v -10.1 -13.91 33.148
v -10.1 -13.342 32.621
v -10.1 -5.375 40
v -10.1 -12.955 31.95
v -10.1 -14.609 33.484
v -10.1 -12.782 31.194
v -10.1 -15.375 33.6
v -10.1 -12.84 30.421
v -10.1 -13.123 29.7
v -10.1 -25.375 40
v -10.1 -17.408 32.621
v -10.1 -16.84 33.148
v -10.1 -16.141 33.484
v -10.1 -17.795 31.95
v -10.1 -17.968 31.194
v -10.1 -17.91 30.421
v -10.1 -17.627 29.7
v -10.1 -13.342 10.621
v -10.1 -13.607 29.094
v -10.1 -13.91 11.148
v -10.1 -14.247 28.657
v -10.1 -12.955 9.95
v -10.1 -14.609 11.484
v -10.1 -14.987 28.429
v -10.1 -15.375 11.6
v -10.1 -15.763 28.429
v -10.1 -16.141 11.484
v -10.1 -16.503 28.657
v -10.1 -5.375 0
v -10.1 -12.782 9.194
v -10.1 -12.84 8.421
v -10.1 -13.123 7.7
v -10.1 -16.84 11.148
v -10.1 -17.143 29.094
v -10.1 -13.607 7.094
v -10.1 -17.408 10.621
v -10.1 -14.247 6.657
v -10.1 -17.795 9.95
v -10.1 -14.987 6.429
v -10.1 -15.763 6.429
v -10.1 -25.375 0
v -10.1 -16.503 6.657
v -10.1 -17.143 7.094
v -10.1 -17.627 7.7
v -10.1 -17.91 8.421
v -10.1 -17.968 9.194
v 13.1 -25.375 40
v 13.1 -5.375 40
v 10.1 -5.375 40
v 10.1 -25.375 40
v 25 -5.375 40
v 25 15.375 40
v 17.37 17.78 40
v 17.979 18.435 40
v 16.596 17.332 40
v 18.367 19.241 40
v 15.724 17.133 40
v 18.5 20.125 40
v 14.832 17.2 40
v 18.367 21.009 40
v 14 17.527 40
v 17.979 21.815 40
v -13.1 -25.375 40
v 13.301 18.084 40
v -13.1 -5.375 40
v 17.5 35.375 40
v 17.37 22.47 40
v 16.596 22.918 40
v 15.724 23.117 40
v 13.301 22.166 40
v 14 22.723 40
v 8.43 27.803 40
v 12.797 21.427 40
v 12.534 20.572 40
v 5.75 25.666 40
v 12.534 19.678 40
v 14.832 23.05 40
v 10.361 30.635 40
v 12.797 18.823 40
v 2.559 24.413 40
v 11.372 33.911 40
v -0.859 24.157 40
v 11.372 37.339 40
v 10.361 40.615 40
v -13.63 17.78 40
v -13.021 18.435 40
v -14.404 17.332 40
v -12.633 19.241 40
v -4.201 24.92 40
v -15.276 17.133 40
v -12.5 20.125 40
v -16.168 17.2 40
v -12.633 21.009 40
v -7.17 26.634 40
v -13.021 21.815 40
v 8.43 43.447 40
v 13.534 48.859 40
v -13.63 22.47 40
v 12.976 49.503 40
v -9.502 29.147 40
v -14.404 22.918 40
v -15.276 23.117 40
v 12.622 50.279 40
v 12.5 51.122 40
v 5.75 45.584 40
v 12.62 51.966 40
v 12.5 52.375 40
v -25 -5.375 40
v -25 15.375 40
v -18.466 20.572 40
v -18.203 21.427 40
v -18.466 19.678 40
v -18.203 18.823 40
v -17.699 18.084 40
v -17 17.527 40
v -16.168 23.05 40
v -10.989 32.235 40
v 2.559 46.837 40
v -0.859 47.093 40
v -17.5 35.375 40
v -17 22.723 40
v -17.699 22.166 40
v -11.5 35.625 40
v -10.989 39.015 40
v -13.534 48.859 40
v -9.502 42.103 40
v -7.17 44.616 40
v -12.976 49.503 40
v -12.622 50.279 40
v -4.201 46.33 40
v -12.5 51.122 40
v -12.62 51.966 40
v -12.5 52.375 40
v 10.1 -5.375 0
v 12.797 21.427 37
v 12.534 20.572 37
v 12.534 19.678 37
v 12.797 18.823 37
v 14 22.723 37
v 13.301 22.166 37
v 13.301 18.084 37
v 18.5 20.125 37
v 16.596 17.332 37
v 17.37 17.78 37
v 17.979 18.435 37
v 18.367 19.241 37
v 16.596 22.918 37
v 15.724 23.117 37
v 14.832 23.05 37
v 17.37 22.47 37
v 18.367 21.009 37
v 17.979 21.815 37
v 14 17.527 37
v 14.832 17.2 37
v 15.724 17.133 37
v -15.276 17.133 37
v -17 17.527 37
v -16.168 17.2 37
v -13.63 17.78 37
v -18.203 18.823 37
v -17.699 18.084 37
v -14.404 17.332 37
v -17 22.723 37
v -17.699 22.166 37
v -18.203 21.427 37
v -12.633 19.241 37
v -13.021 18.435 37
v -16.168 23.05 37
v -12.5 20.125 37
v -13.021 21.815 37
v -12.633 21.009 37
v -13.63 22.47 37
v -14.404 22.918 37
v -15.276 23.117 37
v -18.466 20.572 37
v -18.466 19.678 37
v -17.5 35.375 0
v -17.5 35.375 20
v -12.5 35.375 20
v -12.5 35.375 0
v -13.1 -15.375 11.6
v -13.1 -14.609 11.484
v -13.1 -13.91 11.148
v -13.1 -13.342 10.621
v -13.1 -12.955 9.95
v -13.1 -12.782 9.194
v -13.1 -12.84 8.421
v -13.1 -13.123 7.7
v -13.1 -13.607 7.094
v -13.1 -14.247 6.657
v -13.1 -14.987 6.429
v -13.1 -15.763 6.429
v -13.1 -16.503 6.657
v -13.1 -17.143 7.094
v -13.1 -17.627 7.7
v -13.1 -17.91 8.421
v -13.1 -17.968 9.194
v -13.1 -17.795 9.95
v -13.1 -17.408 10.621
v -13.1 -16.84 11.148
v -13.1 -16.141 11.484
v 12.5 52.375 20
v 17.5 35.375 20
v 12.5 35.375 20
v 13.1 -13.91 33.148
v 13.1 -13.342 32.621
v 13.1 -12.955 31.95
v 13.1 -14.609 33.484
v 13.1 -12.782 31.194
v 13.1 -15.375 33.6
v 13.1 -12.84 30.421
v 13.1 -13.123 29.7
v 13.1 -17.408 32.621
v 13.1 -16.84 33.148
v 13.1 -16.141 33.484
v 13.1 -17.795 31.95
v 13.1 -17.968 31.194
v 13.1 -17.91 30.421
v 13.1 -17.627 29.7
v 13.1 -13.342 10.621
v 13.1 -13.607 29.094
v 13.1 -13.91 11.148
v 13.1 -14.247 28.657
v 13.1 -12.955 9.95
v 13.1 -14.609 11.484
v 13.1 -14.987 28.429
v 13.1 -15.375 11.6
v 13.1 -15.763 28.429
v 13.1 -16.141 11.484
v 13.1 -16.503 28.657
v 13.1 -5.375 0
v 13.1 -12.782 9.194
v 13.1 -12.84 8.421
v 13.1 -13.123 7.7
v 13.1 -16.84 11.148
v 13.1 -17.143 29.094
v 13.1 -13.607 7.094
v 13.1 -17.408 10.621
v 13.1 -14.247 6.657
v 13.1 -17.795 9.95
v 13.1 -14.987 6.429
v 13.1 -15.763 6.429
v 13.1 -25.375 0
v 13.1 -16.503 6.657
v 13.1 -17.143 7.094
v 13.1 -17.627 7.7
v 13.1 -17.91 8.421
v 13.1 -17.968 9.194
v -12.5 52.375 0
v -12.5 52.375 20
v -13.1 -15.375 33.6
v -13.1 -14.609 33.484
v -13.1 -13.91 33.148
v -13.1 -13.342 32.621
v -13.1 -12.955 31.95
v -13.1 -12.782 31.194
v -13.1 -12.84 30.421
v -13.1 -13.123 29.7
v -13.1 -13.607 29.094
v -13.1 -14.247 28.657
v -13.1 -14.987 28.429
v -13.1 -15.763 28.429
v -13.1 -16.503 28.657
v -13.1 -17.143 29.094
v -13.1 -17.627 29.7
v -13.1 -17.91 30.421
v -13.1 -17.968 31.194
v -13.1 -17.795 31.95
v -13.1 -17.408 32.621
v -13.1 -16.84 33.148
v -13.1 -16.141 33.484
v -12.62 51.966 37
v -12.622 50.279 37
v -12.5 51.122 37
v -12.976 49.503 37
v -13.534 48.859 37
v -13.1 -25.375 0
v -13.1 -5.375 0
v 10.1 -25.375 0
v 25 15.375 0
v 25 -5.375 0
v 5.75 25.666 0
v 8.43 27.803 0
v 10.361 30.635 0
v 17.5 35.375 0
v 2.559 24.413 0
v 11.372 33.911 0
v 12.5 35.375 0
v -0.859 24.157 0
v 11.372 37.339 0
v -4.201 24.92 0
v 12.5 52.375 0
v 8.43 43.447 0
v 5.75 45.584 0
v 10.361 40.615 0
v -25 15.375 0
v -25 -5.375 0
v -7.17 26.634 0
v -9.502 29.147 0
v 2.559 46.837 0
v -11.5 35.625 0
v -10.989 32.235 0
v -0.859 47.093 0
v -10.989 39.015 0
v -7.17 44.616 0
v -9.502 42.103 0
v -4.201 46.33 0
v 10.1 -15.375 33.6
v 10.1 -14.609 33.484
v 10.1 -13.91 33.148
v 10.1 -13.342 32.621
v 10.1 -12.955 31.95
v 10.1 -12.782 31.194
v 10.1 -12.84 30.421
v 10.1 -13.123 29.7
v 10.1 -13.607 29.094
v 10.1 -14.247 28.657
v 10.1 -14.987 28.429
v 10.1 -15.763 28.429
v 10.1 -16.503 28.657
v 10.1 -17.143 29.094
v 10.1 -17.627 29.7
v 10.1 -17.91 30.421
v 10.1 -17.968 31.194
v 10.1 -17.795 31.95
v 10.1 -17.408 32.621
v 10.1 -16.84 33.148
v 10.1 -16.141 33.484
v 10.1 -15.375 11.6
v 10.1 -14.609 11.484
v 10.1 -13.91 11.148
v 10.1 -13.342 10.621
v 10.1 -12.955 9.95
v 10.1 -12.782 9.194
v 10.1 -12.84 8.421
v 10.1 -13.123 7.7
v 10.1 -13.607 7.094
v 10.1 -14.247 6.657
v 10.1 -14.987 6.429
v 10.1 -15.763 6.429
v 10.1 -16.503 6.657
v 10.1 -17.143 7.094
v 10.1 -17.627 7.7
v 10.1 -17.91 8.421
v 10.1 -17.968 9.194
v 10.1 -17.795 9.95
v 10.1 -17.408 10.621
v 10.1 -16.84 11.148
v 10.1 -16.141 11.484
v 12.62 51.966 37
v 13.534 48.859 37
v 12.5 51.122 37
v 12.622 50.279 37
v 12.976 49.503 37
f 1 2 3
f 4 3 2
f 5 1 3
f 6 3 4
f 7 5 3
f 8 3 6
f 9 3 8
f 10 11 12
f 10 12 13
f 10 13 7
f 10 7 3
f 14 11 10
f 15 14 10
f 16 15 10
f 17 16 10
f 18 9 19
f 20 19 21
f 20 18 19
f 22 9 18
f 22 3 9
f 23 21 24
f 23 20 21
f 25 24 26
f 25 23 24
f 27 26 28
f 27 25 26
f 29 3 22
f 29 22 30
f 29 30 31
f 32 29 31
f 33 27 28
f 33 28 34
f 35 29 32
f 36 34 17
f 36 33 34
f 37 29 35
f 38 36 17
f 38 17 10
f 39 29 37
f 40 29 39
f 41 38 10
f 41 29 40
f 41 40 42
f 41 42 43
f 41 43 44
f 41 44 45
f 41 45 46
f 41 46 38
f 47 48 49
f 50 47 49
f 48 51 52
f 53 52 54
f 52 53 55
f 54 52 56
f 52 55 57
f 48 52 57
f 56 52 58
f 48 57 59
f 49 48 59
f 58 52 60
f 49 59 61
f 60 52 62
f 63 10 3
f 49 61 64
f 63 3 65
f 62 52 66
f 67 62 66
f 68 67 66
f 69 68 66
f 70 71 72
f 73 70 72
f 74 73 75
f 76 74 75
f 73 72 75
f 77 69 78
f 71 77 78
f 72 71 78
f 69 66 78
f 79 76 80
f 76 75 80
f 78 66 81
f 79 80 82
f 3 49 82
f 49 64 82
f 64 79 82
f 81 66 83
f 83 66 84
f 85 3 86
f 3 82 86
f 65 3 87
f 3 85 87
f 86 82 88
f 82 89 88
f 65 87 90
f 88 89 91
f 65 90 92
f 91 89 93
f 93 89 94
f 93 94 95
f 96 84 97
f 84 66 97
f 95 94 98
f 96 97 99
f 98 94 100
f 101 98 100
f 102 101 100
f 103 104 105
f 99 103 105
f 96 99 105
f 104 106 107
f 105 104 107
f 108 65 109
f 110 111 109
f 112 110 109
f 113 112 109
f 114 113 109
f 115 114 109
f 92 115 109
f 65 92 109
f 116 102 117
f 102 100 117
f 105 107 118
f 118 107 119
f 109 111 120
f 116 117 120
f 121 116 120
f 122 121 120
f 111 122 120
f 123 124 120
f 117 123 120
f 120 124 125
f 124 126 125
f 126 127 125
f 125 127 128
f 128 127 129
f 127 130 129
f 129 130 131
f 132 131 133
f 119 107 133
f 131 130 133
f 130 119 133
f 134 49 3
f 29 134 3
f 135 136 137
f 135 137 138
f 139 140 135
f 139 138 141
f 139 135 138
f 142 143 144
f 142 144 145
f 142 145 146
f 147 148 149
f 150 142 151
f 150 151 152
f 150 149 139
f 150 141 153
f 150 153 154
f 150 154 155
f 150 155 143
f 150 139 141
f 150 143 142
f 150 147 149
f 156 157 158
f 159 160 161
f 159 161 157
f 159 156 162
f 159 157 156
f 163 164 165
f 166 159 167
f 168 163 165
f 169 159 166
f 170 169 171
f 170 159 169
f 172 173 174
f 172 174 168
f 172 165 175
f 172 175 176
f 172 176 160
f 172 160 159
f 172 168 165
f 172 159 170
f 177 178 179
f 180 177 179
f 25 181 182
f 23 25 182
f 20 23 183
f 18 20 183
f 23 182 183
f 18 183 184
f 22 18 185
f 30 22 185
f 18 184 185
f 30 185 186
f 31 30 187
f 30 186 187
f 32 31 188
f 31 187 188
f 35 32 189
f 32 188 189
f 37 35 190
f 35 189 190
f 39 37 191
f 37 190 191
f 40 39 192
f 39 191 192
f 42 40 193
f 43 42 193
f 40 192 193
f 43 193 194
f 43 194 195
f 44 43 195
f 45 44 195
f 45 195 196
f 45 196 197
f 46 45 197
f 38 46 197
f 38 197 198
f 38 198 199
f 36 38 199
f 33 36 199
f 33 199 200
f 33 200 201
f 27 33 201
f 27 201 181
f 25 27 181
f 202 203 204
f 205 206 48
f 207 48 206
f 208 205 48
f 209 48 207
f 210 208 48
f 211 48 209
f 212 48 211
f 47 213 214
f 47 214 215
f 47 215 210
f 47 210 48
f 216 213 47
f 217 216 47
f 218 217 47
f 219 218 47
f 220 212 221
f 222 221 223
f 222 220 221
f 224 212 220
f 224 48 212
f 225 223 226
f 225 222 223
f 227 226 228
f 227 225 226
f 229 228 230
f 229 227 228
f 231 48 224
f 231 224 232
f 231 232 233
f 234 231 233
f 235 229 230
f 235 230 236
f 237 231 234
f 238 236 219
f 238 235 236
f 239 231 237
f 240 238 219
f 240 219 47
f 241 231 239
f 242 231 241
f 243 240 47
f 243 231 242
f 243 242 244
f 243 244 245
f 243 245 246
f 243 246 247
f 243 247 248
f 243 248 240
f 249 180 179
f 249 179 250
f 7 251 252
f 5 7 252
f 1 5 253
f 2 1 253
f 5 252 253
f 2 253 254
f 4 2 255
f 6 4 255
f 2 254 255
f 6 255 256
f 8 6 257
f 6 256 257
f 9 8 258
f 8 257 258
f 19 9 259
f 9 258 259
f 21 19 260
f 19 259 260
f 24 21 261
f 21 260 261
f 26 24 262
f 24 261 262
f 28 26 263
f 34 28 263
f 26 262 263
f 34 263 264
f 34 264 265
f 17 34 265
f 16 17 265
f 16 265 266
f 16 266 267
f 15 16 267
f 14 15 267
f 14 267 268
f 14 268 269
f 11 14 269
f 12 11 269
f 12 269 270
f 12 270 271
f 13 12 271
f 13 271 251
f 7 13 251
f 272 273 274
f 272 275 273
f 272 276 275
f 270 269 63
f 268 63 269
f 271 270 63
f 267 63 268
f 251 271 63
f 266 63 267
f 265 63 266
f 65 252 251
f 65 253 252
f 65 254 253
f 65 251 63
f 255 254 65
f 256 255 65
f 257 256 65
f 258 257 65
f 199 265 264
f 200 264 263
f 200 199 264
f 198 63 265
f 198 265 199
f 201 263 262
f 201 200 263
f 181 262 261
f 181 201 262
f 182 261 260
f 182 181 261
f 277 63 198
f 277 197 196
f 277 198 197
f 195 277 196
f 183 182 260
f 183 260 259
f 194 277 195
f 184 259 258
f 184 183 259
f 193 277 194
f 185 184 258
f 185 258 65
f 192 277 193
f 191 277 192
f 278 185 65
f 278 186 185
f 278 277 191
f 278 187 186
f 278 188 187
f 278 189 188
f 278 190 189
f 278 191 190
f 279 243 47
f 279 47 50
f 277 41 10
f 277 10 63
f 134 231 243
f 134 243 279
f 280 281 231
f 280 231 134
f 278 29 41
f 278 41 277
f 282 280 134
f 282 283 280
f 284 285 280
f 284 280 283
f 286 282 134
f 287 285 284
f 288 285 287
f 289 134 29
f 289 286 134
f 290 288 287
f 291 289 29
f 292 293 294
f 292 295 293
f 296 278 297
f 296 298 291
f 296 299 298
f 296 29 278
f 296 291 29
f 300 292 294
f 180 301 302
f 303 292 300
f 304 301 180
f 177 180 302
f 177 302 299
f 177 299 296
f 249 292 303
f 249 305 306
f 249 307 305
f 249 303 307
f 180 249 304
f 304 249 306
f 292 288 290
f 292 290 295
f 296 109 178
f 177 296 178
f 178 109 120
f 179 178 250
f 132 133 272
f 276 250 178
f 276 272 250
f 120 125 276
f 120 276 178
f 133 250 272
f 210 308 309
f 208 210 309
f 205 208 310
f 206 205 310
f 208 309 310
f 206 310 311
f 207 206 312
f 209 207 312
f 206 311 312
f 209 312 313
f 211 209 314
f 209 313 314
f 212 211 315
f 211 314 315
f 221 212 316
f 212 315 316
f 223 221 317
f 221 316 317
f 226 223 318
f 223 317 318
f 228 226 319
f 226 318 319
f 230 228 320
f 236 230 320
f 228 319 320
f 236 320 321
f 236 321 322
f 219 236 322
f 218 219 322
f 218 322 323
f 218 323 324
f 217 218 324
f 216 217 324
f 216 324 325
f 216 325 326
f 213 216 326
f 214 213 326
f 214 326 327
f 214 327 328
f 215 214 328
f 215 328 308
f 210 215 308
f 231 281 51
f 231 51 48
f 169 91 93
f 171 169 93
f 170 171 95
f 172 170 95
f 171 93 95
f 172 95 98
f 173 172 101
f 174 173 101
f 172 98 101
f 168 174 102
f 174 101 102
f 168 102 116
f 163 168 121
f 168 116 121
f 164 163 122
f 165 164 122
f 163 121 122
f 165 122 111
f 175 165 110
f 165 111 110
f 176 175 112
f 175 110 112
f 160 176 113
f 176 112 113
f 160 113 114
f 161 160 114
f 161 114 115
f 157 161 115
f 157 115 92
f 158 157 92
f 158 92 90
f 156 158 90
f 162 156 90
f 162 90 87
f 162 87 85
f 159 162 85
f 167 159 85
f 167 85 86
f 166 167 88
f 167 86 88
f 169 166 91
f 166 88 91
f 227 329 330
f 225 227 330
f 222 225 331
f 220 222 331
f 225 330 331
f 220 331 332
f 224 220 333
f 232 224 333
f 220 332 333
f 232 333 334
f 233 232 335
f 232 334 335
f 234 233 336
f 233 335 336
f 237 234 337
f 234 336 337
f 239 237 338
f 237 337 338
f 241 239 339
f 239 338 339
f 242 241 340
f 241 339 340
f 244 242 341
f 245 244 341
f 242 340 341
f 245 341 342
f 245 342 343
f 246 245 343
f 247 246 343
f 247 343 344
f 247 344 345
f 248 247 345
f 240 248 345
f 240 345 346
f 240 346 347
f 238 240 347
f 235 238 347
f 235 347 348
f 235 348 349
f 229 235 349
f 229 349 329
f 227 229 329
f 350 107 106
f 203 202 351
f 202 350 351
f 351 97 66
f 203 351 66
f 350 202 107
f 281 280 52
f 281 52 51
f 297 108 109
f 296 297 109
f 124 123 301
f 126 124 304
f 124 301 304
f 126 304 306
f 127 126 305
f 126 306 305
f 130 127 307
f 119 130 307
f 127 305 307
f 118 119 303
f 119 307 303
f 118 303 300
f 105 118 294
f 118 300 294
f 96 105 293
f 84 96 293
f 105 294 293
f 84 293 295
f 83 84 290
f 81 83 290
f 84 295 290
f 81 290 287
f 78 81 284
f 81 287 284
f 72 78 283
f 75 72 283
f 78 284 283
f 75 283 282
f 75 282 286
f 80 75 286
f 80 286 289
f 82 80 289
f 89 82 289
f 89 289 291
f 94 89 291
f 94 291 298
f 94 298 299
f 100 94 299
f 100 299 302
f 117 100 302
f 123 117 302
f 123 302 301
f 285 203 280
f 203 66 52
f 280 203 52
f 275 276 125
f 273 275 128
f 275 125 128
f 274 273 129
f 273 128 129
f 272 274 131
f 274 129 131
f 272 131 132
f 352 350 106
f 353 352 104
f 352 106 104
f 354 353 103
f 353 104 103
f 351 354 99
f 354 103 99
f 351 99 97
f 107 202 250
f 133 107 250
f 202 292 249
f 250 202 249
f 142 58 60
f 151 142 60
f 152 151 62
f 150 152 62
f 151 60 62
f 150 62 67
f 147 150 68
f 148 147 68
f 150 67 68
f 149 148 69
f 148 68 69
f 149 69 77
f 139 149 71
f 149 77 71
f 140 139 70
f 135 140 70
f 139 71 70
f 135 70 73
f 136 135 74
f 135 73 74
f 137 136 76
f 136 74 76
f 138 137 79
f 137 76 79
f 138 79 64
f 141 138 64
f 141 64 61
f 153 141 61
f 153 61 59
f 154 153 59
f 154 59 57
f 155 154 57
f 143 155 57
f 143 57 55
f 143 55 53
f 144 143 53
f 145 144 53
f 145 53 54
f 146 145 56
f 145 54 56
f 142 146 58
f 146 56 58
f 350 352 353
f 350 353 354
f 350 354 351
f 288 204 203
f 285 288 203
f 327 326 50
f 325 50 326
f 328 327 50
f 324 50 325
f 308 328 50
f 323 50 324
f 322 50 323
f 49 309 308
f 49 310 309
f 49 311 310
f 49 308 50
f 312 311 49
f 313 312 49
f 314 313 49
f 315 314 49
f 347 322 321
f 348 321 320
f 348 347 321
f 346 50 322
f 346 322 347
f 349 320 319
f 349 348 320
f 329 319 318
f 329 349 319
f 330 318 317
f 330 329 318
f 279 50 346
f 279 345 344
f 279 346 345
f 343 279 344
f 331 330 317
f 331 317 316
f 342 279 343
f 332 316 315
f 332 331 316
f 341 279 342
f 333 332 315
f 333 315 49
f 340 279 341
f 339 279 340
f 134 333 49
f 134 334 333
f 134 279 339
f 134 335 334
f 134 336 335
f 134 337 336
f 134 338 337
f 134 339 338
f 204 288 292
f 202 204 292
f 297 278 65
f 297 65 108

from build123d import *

# Parameters (mm, degrees)
EXTRUDE_1_DEPTH     = 40
SKETCH_2_W          = 25
SKETCH_2_H          = 47
EXTRUDE_2_DEPTH     = 40
HOLE_WIZARD_3_D     = 23
EXTRUDE_3_DEPTH     = 40
EXTRUDE_5_DEPTH     = 20
HOLE_WIZARD_4_D     = 5.2
SKETCH_15_R         = 3
CUT_EXTRUDE_1_DEPTH = 3


with BuildPart() as part:
    # 草图1 → 凸台-拉伸1 (new body)
    with BuildSketch(Plane.XY):
        Polygon((13.1, -5.375), (13.1, -25.375), (10.1, -25.375), (10.1, -5.375), (-10.1, -5.375), (-10.1, -25.375), (-13.1, -25.375), (-13.1, -5.375), (-25, -5.375), (-25, 5.375), (25, 5.375), (25, -5.375), align=None)
    extrude(amount=EXTRUDE_1_DEPTH)

    # 草图2 → 凸台-拉伸2 (add)
    with BuildSketch(Plane(origin=(0, 0, 0), x_dir=(-1, 0, 0), z_dir=(0, 0, -1))):
        with Locations((0, 28.875)):
            Rectangle(SKETCH_2_W, SKETCH_2_H)
    extrude(amount=-EXTRUDE_2_DEPTH)

    # 孔3 (through all)
    with Locations(Plane.XY.offset(40)):
        with Locations((0, 35.625)):
            Hole(HOLE_WIZARD_3_D / 2)

    # 草图10 → 凸台-拉伸3 (add)
    with BuildSketch(Plane.XY.offset(40)):
        Polygon((12.5, 35.375), (17.5, 35.375), (25, 15.375), (25, 5.375), (12.5, 5.375), align=None)
        Polygon((-12.5, 35.375), (-12.5, 5.375), (-25, 5.375), (-25, 15.375), (-17.5, 35.375), align=None)
    extrude(amount=-EXTRUDE_3_DEPTH)

    # 草图12 → 凸台-拉伸5 (add)
    with BuildSketch(Plane.XY.offset(40)):
        Polygon((12.5, 52.375), (17.5, 35.375), (12.5, 35.375), align=None)
        Polygon((-12.5, 52.375), (-17.5, 35.375), (-12.5, 35.375), align=None)
    extrude(amount=-EXTRUDE_5_DEPTH)

    # 孔4 (through all)
    with Locations(Plane(origin=(13.1, 0, 0), x_dir=(0, 0, -1), z_dir=(1, 0, 0))):
        with Locations((-31, -15.375), (-9, -15.375)):
            Hole(HOLE_WIZARD_4_D / 2)

    # 草图15 → 切除-拉伸1 (cut)
    with BuildSketch(Plane.XY.offset(40)):
        with Locations((-15.5, 51.125)):
            Circle(SKETCH_15_R)
        with Locations((15.5, 51.125)):
            Circle(SKETCH_15_R)
        with Locations((-15.5, 20.125)):
            Circle(SKETCH_15_R)
        with Locations((15.5, 20.125)):
            Circle(SKETCH_15_R)
    extrude(amount=-CUT_EXTRUDE_1_DEPTH, mode=Mode.SUBTRACT)


solid = part.part
